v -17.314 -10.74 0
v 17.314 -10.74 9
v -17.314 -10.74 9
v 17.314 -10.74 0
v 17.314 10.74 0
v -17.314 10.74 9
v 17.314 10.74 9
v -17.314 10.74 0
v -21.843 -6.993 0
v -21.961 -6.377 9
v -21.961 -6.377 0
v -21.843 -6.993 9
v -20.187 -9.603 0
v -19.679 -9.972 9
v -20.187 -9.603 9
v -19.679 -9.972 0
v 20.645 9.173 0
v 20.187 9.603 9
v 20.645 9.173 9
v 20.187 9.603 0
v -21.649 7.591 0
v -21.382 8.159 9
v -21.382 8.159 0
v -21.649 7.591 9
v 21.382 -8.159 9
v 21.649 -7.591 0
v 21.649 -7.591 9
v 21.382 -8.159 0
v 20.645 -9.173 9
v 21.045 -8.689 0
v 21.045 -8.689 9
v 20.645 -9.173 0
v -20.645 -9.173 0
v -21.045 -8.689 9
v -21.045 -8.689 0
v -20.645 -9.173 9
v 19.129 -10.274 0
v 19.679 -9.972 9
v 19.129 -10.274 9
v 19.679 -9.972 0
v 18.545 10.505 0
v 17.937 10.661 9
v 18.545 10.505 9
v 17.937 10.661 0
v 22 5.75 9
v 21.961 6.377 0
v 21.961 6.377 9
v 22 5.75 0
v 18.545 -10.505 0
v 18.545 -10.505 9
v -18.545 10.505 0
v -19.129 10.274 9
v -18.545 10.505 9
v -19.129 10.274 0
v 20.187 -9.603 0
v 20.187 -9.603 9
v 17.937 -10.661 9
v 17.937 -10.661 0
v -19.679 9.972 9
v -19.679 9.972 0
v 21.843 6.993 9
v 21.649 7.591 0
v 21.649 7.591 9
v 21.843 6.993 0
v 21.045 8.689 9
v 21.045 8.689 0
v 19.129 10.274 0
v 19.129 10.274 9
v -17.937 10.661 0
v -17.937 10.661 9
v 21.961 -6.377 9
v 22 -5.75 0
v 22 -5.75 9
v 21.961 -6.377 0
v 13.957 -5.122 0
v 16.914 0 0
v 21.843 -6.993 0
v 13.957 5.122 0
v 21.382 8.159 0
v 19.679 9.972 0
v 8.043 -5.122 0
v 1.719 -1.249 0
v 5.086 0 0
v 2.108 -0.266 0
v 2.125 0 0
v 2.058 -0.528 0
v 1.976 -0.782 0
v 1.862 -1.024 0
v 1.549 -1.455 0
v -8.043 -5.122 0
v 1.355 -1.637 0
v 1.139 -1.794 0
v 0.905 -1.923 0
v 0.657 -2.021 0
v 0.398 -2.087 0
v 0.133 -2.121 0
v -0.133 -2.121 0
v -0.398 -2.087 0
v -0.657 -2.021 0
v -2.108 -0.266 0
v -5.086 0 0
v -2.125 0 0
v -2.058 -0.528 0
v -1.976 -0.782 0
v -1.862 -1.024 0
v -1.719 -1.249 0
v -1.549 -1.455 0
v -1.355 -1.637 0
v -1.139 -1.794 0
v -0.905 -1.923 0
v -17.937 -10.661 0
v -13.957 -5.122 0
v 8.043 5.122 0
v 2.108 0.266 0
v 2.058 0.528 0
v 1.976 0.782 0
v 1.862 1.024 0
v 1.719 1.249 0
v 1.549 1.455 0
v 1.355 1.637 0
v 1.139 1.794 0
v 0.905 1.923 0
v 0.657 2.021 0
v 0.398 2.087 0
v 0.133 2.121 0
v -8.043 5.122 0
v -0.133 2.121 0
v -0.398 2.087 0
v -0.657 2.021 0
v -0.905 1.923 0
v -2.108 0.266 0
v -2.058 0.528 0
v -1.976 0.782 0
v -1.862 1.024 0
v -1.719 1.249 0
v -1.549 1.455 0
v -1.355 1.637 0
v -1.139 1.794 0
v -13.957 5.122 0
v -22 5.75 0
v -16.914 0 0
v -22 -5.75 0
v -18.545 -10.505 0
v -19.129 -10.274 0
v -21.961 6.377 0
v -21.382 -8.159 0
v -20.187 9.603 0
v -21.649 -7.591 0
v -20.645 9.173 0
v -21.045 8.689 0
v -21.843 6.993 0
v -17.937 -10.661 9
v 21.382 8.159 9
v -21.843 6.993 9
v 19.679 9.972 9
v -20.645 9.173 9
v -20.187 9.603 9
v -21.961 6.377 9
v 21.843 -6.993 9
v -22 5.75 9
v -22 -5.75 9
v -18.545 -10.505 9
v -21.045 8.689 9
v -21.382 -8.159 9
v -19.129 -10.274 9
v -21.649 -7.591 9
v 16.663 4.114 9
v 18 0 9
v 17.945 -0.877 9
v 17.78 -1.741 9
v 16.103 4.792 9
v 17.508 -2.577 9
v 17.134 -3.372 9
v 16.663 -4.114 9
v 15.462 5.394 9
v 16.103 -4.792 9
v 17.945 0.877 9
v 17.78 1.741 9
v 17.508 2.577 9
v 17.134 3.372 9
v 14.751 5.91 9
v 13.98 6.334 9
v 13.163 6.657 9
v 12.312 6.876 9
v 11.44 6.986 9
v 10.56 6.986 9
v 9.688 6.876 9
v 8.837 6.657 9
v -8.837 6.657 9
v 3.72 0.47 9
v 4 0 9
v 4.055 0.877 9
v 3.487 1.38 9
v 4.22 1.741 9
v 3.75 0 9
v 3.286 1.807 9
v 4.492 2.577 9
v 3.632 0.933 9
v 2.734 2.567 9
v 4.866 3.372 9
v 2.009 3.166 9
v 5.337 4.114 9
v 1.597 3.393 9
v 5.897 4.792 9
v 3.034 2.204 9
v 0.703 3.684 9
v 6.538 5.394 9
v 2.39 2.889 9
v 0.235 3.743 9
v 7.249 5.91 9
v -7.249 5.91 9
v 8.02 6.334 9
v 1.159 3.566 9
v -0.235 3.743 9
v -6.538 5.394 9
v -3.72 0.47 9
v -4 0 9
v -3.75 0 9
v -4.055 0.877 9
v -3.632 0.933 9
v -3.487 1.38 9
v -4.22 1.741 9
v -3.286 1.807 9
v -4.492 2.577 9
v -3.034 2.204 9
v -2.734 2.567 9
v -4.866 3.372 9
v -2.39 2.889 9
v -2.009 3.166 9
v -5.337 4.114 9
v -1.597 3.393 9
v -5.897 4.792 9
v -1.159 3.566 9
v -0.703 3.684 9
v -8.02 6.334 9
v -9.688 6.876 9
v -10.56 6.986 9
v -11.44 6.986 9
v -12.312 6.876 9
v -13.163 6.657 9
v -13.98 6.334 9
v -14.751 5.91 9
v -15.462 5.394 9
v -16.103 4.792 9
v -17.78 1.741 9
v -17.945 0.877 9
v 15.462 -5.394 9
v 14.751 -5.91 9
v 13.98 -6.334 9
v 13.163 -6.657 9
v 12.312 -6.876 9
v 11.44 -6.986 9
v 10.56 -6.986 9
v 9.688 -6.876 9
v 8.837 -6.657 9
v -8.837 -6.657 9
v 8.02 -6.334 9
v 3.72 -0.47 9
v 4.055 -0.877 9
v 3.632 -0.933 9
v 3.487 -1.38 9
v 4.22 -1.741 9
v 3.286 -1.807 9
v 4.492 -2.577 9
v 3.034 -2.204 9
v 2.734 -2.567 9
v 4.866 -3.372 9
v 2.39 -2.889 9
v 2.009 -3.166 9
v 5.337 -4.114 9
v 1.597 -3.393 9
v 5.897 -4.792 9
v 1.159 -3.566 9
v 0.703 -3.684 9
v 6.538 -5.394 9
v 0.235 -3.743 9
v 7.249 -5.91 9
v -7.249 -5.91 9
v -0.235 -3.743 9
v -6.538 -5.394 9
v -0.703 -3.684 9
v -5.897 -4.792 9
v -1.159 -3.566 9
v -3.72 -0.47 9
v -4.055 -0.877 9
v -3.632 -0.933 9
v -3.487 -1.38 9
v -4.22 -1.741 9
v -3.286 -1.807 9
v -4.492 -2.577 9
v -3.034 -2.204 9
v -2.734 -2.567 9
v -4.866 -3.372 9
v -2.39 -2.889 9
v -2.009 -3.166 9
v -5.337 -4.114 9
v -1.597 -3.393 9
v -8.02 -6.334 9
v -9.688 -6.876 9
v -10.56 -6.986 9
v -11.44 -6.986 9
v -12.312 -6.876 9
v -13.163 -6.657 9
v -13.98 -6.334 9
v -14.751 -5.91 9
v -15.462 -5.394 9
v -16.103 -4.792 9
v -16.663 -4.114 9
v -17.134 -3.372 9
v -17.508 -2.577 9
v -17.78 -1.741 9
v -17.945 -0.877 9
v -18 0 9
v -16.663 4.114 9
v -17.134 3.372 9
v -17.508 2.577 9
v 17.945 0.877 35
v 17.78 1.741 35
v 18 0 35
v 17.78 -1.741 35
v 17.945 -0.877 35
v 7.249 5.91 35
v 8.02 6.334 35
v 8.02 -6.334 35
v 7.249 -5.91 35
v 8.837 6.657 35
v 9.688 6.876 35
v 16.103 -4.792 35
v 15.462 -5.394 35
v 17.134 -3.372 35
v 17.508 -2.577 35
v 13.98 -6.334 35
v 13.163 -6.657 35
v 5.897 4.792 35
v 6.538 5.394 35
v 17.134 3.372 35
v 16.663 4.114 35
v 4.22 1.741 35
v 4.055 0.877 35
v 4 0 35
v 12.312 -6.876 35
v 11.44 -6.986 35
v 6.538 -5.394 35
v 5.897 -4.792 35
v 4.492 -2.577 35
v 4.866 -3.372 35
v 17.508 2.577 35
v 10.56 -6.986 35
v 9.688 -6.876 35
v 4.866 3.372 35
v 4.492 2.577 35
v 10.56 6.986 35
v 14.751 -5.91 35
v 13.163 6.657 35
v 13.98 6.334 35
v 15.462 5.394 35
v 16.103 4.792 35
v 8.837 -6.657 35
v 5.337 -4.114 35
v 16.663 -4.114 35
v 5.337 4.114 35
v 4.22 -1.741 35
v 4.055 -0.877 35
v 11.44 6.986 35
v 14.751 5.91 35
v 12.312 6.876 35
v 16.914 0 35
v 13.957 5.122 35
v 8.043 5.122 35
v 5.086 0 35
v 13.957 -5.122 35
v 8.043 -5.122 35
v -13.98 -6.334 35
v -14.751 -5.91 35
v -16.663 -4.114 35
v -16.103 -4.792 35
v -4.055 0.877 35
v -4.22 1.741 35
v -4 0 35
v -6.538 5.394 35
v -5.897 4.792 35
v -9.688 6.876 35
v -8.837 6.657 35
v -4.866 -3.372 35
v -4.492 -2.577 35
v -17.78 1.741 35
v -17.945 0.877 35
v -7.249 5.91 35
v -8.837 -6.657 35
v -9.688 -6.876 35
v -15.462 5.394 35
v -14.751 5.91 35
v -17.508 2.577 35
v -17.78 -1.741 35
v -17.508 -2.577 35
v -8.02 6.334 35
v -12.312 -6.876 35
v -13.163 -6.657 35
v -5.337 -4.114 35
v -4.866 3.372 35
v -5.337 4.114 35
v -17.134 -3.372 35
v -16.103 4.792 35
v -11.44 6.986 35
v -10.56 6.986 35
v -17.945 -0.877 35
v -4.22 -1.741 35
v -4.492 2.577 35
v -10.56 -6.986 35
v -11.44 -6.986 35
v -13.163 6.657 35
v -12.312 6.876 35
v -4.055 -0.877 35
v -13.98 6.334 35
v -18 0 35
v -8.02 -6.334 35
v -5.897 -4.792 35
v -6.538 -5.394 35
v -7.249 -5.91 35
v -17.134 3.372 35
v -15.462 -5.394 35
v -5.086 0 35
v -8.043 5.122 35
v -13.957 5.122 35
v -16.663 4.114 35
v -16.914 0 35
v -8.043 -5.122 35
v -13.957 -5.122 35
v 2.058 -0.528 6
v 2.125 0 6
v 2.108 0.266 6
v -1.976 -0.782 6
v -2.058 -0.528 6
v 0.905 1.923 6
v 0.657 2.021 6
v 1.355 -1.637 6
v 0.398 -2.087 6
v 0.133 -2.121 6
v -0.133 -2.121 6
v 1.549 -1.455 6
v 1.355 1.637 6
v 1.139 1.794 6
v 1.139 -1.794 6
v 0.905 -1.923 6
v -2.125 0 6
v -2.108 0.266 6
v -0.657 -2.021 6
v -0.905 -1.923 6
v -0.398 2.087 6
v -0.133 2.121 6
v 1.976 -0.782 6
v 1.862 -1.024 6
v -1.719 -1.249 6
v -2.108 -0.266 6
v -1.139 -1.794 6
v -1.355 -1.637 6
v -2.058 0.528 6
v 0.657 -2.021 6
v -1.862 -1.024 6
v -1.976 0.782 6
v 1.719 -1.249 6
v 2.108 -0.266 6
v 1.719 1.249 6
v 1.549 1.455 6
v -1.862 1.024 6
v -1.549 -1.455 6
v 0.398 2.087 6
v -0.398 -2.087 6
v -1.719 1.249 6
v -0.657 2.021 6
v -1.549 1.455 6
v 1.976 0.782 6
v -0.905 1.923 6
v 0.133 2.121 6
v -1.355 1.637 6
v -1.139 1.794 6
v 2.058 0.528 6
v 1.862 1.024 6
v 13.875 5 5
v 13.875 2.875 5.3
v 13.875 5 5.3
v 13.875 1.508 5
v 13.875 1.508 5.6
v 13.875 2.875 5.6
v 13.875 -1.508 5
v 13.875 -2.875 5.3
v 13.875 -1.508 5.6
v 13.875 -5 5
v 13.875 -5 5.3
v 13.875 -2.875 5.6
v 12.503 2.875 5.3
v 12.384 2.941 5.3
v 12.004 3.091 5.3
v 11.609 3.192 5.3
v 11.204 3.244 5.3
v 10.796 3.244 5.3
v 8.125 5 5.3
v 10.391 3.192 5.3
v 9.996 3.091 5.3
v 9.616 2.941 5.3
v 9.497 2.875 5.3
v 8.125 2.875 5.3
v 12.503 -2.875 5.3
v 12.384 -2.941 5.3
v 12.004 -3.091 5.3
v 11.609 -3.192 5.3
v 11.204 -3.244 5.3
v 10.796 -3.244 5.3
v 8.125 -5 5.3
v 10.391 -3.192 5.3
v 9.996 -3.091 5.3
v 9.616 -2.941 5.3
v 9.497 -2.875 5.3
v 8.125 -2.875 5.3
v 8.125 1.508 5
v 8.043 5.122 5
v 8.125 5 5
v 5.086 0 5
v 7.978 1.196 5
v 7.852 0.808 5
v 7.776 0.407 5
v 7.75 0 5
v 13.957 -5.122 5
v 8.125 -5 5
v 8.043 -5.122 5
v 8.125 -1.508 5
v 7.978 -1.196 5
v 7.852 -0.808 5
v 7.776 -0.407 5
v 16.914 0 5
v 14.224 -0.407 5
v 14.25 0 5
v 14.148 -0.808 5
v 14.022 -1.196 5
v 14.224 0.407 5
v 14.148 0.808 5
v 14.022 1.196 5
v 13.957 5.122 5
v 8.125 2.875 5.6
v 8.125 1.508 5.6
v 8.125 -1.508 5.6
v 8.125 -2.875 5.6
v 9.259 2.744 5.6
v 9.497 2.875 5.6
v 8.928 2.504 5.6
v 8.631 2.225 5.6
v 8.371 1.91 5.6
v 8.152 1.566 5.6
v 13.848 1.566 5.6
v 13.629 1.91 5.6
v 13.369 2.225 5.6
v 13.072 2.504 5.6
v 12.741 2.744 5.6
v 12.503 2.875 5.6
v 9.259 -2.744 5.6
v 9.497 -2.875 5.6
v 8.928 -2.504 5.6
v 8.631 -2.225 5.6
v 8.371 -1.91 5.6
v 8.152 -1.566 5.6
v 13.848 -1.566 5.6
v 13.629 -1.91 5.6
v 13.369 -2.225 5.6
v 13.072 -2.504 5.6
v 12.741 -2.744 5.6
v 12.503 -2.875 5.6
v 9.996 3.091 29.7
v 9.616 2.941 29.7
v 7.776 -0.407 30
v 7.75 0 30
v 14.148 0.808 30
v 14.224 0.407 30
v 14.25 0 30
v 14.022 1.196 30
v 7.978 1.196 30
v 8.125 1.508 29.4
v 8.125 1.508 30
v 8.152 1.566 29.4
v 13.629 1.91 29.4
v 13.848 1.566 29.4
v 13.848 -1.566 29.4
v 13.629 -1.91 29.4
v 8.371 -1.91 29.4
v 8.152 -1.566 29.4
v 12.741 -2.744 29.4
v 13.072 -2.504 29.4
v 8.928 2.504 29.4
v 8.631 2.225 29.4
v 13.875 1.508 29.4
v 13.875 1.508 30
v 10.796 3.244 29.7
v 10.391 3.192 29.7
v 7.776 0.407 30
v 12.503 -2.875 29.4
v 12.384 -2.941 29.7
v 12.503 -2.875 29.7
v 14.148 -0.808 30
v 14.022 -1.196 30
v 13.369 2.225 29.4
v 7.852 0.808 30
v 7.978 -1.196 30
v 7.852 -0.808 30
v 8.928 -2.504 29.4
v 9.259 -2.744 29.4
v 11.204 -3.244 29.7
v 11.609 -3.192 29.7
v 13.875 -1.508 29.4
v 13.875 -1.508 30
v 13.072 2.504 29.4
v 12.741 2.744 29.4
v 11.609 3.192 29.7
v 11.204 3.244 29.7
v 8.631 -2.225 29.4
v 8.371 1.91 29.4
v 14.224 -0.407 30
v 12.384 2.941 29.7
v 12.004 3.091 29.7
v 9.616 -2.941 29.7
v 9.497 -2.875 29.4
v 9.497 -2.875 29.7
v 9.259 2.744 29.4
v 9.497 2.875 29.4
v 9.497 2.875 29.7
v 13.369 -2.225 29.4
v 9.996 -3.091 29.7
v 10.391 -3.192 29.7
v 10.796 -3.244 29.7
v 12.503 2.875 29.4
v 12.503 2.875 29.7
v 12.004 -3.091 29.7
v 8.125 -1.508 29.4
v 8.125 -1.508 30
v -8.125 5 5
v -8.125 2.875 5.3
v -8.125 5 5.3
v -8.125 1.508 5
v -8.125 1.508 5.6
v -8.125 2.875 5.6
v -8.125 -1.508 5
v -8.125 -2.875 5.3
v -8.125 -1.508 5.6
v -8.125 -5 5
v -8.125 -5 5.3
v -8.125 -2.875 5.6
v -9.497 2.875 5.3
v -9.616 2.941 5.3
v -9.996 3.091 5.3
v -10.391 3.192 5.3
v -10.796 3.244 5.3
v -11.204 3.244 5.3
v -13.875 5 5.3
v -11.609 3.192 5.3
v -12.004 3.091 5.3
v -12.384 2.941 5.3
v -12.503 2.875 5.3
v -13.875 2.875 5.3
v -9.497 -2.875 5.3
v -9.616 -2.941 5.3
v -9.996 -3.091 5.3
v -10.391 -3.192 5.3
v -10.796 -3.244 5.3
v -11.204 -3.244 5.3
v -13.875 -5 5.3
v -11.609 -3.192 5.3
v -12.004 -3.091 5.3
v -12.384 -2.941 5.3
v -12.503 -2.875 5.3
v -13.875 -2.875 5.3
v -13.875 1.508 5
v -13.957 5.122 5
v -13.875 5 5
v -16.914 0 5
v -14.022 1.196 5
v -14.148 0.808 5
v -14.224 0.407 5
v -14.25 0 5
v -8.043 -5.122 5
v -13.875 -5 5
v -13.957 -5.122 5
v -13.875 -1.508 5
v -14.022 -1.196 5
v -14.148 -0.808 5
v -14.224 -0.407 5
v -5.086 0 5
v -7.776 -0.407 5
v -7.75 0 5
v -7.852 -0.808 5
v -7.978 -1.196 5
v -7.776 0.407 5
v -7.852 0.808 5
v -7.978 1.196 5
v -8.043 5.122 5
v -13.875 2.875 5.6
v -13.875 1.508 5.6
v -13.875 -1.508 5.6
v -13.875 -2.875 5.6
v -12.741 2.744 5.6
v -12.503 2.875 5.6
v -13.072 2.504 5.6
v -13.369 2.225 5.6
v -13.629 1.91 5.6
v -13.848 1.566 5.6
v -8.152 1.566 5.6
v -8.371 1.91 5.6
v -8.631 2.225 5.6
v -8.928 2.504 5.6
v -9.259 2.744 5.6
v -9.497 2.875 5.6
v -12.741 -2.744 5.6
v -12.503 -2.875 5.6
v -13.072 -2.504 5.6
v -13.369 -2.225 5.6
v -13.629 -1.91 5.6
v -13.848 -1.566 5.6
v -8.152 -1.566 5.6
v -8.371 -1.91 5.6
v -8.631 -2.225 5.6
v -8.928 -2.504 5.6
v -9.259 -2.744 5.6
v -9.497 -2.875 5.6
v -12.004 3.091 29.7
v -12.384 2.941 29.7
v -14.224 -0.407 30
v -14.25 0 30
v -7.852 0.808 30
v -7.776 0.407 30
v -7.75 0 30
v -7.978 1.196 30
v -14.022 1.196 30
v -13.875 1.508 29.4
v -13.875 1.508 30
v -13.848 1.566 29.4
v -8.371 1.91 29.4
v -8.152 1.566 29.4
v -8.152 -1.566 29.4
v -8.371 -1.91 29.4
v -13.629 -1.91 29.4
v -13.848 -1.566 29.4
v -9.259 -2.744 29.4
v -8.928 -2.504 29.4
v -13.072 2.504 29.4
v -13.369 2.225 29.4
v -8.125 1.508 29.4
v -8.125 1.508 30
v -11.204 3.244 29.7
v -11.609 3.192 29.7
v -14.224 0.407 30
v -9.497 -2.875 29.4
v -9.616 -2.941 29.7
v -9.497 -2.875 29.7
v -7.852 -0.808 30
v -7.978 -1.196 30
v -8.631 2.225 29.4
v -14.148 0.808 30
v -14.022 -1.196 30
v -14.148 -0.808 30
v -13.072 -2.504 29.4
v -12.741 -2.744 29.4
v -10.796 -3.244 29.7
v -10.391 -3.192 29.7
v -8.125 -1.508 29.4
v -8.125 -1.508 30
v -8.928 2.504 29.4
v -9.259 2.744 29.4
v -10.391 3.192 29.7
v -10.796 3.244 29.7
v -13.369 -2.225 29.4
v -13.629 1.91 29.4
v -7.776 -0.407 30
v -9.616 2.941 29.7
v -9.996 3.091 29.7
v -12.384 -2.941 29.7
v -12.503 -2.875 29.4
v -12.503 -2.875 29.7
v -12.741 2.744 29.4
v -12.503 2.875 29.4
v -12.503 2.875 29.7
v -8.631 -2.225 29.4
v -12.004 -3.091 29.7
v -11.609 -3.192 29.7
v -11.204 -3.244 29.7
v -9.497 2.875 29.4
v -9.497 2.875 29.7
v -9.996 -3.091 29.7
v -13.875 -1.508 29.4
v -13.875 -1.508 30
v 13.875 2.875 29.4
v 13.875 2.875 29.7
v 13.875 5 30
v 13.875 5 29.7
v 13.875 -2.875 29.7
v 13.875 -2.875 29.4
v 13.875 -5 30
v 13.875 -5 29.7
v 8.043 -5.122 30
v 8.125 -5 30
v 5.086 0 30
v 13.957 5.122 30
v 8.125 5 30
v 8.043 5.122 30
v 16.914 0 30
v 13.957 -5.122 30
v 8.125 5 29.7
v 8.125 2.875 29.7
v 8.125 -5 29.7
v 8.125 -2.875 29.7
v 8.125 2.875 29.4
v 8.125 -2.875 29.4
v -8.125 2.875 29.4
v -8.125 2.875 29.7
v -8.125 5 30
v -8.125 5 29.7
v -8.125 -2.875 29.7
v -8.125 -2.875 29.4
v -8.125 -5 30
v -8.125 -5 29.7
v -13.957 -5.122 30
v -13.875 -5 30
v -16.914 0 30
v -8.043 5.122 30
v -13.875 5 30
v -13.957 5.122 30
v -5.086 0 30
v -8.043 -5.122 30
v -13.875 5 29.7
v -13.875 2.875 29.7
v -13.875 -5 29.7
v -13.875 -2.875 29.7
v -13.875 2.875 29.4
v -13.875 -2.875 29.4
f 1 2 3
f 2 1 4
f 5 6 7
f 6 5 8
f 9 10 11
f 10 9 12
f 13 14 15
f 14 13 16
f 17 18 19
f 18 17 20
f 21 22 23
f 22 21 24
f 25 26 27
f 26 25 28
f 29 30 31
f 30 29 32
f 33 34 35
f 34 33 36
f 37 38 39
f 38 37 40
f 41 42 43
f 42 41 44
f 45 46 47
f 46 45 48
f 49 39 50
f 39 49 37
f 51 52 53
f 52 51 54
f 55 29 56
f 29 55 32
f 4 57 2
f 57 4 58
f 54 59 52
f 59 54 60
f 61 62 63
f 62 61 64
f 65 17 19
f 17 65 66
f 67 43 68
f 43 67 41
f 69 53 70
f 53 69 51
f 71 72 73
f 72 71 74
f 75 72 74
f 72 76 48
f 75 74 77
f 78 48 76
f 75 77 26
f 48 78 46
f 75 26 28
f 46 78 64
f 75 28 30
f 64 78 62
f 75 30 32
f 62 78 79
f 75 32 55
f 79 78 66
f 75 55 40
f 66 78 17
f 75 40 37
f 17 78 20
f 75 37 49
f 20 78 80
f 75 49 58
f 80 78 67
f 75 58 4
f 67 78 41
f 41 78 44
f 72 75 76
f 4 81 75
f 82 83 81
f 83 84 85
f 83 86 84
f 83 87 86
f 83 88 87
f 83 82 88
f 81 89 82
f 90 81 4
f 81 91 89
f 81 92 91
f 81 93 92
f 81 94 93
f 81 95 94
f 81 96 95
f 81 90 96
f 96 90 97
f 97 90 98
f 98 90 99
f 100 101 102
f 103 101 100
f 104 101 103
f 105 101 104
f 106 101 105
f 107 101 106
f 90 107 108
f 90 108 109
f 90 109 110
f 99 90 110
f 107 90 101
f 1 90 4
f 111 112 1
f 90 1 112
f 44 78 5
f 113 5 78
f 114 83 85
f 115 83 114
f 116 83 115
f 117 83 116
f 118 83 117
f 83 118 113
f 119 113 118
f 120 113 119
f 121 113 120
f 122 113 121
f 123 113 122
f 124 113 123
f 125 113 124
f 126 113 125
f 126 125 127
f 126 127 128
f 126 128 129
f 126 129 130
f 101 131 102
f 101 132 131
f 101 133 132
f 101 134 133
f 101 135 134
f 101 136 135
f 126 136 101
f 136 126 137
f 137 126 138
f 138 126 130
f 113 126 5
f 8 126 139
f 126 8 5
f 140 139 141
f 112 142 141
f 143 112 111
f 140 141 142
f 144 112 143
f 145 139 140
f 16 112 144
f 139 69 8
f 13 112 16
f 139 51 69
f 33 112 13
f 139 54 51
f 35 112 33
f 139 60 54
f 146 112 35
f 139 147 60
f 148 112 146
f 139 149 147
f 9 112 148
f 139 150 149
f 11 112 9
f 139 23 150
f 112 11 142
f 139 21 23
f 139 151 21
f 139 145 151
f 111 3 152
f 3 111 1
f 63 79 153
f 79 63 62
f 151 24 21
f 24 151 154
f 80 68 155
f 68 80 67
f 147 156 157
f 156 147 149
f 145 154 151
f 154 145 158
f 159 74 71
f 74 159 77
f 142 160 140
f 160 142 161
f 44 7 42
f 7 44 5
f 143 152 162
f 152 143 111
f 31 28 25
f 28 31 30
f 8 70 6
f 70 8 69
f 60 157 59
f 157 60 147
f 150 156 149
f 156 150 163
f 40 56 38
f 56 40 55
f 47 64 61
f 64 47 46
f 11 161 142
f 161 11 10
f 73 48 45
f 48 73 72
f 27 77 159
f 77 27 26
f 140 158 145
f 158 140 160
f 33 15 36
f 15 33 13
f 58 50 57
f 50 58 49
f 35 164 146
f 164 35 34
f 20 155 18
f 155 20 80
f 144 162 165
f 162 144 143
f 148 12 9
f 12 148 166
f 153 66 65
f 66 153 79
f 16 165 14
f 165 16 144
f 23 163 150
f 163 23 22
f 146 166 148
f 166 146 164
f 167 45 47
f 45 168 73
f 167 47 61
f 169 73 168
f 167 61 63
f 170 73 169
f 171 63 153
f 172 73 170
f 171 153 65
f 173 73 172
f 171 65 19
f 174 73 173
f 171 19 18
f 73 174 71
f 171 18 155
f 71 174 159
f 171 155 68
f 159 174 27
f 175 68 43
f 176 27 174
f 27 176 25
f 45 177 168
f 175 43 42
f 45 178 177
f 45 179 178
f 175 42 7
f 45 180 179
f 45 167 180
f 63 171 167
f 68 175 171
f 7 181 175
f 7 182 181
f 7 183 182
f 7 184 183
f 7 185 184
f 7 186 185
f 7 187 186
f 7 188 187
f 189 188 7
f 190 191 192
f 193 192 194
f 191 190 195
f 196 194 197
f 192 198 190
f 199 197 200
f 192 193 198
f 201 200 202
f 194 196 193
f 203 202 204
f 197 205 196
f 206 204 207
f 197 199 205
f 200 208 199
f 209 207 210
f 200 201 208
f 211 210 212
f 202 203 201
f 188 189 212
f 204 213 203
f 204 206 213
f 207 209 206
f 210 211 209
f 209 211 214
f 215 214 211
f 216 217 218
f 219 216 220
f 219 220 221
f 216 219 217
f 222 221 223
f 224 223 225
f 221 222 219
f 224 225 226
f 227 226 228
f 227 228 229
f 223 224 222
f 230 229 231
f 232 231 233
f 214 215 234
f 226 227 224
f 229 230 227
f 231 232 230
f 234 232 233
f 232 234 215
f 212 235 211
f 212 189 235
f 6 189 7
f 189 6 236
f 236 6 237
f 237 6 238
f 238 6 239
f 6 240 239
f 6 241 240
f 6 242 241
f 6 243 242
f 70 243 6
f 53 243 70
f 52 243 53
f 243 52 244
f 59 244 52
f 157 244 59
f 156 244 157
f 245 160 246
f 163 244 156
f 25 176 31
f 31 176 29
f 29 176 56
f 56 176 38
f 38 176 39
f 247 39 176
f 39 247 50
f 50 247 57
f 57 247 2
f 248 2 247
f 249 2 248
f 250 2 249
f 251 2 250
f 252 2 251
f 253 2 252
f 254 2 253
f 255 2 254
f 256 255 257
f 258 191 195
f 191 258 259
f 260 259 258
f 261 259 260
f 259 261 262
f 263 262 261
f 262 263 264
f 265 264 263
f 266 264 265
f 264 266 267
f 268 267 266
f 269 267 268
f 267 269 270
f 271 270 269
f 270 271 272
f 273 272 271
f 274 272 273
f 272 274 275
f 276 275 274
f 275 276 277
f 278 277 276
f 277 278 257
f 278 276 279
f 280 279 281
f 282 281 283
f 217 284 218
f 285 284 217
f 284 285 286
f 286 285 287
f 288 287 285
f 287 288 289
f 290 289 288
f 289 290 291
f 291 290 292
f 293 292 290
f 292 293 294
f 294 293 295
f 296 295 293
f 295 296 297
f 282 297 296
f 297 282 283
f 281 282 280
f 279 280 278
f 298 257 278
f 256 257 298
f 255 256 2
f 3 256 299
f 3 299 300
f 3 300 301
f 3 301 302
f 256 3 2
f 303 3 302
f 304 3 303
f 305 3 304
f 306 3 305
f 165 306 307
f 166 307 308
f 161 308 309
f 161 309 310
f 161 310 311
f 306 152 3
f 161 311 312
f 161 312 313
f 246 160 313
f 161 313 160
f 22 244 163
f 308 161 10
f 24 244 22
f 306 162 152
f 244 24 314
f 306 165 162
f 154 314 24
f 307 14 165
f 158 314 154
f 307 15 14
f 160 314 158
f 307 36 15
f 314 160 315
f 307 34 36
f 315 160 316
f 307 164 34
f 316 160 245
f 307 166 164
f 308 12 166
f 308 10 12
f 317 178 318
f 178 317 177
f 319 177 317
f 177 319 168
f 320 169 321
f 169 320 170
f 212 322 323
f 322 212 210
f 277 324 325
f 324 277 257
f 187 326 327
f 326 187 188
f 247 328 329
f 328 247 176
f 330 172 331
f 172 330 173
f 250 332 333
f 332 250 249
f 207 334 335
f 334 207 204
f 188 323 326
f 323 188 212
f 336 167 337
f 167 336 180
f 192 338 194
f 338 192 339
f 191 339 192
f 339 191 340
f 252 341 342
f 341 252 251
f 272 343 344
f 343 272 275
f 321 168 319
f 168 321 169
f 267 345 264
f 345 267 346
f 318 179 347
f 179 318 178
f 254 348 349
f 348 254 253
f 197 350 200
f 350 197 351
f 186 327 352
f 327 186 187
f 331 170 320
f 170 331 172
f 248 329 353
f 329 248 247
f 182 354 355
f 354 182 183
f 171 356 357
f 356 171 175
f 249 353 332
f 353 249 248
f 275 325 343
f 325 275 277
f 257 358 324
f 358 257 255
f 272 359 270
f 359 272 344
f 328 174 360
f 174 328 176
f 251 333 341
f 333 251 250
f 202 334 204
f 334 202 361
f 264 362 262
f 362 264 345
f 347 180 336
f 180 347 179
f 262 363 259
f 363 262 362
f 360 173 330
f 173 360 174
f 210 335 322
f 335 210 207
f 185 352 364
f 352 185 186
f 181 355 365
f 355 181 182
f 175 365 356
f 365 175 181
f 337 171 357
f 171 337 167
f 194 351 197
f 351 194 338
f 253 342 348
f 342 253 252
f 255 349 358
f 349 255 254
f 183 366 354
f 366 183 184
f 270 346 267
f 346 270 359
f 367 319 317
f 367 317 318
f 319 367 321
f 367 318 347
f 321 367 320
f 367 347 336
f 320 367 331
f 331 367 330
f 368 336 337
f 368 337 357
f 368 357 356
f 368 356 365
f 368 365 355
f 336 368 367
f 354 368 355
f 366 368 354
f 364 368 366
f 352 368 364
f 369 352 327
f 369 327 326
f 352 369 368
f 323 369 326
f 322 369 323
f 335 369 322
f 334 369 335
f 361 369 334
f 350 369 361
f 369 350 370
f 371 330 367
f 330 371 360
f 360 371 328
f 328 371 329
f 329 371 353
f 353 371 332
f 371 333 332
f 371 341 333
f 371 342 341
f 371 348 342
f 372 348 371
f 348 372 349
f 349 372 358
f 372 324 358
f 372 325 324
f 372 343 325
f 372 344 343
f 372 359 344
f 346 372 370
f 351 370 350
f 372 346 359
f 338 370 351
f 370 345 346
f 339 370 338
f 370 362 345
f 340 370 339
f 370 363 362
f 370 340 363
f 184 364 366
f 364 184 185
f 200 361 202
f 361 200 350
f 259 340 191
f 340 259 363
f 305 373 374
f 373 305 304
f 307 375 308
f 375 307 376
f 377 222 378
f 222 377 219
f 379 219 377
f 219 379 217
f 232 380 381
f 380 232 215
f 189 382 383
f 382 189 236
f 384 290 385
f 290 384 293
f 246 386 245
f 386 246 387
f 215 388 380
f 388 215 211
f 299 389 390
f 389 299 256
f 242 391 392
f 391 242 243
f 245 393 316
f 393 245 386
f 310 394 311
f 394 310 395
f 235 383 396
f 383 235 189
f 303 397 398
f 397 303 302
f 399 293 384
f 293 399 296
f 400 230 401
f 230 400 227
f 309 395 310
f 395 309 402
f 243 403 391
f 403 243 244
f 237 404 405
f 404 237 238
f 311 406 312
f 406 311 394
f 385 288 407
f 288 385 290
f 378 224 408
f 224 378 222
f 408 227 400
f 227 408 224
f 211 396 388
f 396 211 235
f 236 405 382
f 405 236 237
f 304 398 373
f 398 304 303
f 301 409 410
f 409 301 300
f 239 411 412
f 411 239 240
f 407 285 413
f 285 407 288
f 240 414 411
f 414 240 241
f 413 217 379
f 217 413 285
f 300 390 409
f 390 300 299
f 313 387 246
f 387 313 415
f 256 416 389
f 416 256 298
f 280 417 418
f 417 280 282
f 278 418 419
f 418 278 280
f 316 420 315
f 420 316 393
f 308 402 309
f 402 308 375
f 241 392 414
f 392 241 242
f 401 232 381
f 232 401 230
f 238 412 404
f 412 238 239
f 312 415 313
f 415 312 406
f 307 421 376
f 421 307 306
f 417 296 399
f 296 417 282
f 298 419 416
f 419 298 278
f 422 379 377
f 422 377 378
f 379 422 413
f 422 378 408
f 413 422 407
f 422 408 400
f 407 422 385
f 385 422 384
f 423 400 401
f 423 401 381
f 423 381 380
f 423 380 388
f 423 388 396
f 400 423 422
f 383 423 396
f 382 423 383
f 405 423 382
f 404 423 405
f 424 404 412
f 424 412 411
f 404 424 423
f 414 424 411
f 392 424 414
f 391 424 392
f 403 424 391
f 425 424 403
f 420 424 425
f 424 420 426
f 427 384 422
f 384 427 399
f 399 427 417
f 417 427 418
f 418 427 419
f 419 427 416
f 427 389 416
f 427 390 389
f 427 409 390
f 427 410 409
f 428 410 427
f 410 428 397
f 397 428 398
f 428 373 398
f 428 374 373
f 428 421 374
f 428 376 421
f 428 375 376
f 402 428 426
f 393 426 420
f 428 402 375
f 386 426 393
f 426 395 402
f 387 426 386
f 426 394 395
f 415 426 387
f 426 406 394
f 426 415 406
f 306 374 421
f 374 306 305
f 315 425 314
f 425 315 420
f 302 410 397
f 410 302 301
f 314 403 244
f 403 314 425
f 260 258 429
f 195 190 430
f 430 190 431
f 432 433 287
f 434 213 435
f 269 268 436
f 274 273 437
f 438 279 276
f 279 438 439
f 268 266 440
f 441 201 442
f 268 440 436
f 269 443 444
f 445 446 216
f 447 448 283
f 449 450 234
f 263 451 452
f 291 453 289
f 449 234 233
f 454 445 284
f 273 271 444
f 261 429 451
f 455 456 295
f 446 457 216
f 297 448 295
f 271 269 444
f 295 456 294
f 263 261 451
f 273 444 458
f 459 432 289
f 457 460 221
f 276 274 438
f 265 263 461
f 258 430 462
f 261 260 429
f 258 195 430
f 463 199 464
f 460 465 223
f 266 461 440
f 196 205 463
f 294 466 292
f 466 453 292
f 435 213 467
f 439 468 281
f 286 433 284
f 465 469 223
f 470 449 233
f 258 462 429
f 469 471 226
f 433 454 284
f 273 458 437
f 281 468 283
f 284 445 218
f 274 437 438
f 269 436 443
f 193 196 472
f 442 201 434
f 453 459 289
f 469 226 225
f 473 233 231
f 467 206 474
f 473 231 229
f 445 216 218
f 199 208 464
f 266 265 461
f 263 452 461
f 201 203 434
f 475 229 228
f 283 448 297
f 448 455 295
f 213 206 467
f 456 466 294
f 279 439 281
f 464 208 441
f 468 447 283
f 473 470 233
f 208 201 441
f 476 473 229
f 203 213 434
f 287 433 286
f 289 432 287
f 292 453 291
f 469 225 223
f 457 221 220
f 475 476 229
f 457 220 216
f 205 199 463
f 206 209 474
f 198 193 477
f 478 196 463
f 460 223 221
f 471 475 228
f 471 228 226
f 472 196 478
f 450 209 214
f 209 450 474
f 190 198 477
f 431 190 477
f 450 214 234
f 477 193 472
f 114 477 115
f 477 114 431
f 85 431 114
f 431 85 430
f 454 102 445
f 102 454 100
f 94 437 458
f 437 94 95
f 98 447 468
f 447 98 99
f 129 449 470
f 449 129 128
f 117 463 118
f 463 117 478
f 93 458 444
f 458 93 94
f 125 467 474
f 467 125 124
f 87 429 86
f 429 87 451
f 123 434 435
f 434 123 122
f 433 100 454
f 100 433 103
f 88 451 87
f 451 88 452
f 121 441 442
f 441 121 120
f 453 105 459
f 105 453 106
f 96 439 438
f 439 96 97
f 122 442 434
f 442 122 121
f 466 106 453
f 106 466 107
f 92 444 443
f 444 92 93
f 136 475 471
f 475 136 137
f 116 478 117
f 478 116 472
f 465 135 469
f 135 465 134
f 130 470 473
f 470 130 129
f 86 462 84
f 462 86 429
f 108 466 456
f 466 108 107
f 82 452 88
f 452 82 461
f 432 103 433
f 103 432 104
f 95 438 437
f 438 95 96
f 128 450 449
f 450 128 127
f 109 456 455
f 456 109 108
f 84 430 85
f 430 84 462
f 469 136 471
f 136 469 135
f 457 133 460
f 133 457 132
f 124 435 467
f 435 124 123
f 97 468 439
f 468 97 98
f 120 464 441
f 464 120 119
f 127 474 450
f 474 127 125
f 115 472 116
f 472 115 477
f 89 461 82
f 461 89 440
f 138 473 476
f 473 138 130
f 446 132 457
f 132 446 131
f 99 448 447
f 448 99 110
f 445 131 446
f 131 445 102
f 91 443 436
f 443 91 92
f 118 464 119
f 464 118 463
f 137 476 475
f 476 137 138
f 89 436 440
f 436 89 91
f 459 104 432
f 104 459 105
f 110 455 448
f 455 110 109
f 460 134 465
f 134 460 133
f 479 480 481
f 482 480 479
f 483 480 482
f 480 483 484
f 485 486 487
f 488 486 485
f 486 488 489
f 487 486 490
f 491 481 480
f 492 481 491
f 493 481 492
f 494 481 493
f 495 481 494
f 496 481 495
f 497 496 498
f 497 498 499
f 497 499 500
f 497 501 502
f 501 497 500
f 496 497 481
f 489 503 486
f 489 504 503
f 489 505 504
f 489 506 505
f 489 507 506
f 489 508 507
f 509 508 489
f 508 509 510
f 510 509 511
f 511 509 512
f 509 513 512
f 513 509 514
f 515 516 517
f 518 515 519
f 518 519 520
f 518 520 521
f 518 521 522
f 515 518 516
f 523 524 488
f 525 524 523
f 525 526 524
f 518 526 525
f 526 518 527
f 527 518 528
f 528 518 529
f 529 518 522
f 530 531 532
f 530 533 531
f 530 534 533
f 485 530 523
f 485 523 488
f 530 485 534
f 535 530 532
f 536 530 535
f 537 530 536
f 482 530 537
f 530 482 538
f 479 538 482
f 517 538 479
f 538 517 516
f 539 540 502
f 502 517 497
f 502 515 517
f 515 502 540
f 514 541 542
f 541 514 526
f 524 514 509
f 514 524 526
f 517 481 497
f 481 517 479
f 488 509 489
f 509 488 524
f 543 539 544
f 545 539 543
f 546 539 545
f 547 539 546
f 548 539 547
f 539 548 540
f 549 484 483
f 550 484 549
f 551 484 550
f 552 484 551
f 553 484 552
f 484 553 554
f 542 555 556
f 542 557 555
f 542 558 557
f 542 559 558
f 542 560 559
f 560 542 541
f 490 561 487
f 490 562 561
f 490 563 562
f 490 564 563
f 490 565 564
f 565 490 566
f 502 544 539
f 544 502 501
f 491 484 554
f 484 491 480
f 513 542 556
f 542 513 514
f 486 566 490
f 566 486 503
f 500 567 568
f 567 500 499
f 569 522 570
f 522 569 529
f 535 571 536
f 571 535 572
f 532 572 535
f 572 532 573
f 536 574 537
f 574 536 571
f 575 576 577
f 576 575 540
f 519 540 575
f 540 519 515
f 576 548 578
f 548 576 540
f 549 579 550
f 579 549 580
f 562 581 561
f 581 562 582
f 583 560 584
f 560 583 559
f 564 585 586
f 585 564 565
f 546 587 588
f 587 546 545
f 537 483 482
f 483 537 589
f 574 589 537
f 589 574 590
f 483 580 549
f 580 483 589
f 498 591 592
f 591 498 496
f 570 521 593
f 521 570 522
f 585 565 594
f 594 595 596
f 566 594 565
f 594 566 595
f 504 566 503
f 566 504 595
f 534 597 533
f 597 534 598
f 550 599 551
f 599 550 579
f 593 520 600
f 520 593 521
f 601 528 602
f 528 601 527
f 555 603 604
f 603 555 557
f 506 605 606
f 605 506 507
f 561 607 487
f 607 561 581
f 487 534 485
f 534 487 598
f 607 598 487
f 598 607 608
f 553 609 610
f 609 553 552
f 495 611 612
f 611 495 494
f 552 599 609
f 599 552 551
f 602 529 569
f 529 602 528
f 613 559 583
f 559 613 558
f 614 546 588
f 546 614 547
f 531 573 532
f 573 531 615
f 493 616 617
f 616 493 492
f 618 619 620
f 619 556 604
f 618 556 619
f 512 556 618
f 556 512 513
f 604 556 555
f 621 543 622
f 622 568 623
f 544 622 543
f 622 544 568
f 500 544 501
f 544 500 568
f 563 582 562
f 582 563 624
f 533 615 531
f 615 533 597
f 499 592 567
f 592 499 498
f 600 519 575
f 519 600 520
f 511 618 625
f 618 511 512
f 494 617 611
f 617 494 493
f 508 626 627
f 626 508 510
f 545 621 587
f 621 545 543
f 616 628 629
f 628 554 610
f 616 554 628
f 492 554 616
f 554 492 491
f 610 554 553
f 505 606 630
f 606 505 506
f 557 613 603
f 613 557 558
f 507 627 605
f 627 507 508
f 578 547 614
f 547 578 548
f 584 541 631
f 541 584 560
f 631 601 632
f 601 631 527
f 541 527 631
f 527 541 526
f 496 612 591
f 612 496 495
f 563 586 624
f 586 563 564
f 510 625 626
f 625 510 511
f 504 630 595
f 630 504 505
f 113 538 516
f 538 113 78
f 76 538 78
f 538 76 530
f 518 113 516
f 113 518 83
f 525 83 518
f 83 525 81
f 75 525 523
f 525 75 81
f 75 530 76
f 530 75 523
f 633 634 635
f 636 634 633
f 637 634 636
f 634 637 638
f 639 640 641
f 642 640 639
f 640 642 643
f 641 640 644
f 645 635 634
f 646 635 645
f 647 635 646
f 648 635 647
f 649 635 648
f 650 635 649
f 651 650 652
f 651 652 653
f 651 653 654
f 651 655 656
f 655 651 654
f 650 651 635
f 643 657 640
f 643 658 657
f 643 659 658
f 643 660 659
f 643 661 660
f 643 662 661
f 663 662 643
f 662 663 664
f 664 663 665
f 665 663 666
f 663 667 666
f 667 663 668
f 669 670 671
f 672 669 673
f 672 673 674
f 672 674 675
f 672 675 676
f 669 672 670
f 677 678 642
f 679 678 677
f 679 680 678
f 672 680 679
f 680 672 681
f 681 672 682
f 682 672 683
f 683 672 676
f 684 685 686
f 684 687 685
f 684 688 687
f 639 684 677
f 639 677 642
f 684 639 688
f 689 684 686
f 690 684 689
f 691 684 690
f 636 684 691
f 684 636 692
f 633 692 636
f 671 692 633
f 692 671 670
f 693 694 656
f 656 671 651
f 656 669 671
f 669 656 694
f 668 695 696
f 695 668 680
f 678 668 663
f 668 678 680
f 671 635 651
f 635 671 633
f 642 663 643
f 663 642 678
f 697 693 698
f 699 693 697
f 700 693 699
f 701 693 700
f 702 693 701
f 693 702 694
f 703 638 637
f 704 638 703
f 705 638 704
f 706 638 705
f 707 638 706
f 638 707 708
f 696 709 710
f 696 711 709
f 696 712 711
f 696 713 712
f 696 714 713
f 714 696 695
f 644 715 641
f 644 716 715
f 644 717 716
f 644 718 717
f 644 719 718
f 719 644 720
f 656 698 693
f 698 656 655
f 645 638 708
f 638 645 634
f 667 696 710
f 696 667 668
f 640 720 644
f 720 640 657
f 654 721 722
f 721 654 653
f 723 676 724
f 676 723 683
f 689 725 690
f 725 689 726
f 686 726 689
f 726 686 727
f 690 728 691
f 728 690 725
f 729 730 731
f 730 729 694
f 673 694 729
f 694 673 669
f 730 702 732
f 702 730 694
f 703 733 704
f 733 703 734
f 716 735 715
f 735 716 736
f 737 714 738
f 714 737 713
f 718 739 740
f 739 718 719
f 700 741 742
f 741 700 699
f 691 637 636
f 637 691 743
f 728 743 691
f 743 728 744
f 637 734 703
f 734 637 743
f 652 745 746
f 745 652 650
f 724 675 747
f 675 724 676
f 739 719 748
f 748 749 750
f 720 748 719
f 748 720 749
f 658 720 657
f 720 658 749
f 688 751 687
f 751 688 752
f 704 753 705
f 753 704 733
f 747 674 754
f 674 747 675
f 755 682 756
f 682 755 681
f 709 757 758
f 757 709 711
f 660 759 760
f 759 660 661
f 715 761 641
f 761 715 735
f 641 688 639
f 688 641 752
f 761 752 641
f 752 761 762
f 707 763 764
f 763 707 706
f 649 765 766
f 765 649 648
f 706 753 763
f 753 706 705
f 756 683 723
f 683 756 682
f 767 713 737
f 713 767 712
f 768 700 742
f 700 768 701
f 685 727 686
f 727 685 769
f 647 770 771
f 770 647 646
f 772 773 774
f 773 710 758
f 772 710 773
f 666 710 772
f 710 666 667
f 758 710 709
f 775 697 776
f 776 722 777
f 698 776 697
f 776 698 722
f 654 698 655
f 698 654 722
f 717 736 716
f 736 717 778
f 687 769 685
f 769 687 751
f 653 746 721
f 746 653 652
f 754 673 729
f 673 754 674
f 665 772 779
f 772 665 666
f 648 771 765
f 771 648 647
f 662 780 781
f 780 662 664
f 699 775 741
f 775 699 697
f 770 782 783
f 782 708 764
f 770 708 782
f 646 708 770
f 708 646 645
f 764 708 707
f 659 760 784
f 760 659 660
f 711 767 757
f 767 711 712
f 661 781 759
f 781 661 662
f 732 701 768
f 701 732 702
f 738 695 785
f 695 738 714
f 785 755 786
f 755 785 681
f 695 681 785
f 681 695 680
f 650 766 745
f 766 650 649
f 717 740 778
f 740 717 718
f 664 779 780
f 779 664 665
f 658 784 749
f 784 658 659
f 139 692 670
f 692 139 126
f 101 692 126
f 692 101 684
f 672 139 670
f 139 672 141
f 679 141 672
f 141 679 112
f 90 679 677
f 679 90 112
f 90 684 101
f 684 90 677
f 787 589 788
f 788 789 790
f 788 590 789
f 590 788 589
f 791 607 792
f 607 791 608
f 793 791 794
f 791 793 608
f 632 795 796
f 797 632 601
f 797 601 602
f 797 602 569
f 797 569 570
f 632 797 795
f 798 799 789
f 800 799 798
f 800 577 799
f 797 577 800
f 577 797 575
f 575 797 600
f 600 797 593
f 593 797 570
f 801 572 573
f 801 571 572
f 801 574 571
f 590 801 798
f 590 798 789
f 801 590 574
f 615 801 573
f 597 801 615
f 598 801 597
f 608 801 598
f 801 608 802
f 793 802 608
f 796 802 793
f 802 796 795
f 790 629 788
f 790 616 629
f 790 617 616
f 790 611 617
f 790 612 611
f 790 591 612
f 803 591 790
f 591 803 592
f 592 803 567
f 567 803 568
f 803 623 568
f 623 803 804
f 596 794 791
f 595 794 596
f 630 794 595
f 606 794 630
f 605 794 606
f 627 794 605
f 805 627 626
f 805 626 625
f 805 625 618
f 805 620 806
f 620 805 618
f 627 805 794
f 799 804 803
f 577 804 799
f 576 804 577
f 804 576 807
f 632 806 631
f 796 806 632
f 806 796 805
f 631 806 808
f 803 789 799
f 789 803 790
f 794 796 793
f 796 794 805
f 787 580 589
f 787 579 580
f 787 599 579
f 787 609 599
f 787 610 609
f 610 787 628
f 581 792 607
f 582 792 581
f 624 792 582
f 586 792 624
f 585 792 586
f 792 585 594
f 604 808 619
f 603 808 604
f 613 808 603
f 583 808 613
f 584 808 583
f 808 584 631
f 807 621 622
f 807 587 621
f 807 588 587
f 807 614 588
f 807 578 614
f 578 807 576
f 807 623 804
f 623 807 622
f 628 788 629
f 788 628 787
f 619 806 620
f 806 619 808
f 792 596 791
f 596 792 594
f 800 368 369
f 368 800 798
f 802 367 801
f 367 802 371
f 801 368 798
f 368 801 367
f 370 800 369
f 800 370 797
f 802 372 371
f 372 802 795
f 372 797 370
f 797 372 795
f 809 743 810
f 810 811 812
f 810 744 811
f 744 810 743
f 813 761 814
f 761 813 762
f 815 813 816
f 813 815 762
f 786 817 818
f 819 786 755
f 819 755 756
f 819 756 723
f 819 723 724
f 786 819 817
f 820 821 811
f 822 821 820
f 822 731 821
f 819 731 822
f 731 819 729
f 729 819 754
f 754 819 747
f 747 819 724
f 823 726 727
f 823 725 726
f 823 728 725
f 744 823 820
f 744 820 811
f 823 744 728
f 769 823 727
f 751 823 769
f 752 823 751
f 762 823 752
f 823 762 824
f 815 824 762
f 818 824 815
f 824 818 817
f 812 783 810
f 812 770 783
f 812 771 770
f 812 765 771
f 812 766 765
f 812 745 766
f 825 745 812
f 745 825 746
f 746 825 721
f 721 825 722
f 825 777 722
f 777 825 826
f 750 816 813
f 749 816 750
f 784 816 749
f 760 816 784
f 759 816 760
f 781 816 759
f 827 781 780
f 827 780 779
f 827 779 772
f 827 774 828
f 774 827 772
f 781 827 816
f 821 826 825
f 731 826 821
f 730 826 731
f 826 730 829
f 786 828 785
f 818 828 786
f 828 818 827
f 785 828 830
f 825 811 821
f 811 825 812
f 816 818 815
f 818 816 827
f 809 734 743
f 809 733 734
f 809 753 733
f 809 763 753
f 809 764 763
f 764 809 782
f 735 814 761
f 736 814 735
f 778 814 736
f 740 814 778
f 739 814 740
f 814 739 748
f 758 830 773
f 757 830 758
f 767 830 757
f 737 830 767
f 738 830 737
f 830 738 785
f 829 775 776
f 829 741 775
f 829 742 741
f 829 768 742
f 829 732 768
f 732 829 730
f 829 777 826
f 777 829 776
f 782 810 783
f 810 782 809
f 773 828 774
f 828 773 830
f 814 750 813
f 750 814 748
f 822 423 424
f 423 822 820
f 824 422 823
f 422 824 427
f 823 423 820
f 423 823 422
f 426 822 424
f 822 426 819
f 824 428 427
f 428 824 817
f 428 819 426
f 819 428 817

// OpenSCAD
$fn = 50;


difference() {
	union() {
		hull() {
			translate(v = [-17.0000000000, 5.7500000000, 0]) {
				cylinder(h = 9, r = 5);
			}
			translate(v = [17.0000000000, 5.7500000000, 0]) {
				cylinder(h = 9, r = 5);
			}
			translate(v = [-17.0000000000, -5.7500000000, 0]) {
				cylinder(h = 9, r = 5);
			}
			translate(v = [17.0000000000, -5.7500000000, 0]) {
				cylinder(h = 9, r = 5);
			}
		}
		translate(v = [11.0000000000, 0, 0.0000000000]) {
			cylinder(h = 35, r = 7.0000000000);
		}
		translate(v = [-11.0000000000, 0, 0.0000000000]) {
			cylinder(h = 35, r = 7.0000000000);
		}
	}
	union() {
		translate(v = [0, 0, 9]) {
			rotate(a = [0, 0, 0]) {
				difference() {
					union() {
						#translate(v = [0, 0, -30.0000000000]) {
							cylinder(h = 30, r = 2.0000000000);
						}
						#translate(v = [0, 0, -3]) {
							cylinder(h = 3, r1 = 2.1250000000, r2 = 3.7500000000);
						}
						#translate(v = [0, 0, -30.0000000000]) {
							cylinder(h = 30, r = 2.1250000000);
						}
						#translate(v = [0, 0, -30.0000000000]) {
							cylinder(h = 30, r = 2.0000000000);
						}
					}
					union();
				}
			}
		}
		translate(v = [11.0000000000, 0, 0]) {
			rotate(a = [0, 0, 0]) {
				difference() {
					union() {
						#translate(v = [-2.8750000000, -5.0000000000, -0.3000000000]) {
							cube(size = [5.7500000000, 10, 0.3000000000]);
						}
						#translate(v = [-2.8750000000, -2.8750000000, -0.6000000000]) {
							cube(size = [5.7500000000, 5.7500000000, 0.3000000000]);
						}
						#translate(v = [-2.8750000000, -5.0000000000, 5]) {
							cube(size = [5.7500000000, 10, 0.3000000000]);
						}
						#translate(v = [-2.8750000000, -2.8750000000, 5.3000000000]) {
							cube(size = [5.7500000000, 5.7500000000, 0.3000000000]);
						}
						#translate(v = [0, 0, -100.0000000000]) {
							cylinder(h = 200, r = 3.2500000000);
						}
						#linear_extrude(height = 5) {
							polygon(points = [[5.9142500000, 0.0000000000], [2.9571250000, 5.1218907443], [-2.9571250000, 5.1218907443], [-5.9142500000, 0.0000000000], [-2.9571250000, -5.1218907443], [2.9571250000, -5.1218907443]]);
						}
						#translate(v = [-2.8750000000, -5.0000000000, -0.3000000000]) {
							cube(size = [5.7500000000, 10, 0.3000000000]);
						}
						#translate(v = [-2.8750000000, -2.8750000000, -0.6000000000]) {
							cube(size = [5.7500000000, 5.7500000000, 0.3000000000]);
						}
						#translate(v = [-2.8750000000, -5.0000000000, 5]) {
							cube(size = [5.7500000000, 10, 0.3000000000]);
						}
						#translate(v = [-2.8750000000, -2.8750000000, 5.3000000000]) {
							cube(size = [5.7500000000, 5.7500000000, 0.3000000000]);
						}
						#translate(v = [0, 0, -100.0000000000]) {
							cylinder(h = 200, r = 3.2500000000);
						}
						#translate(v = [-2.8750000000, -5.0000000000, -0.3000000000]) {
							cube(size = [5.7500000000, 10, 0.3000000000]);
						}
						#translate(v = [-2.8750000000, -2.8750000000, -0.6000000000]) {
							cube(size = [5.7500000000, 5.7500000000, 0.3000000000]);
						}
						#translate(v = [-2.8750000000, -5.0000000000, 5]) {
							cube(size = [5.7500000000, 10, 0.3000000000]);
						}
						#translate(v = [-2.8750000000, -2.8750000000, 5.3000000000]) {
							cube(size = [5.7500000000, 5.7500000000, 0.3000000000]);
						}
						#translate(v = [0, 0, -100.0000000000]) {
							cylinder(h = 200, r = 3.2500000000);
						}
					}
					union();
				}
			}
		}
		translate(v = [-11.0000000000, 0, 0]) {
			rotate(a = [0, 0, 0]) {
				difference() {
					union() {
						#translate(v = [-2.8750000000, -5.0000000000, -0.3000000000]) {
							cube(size = [5.7500000000, 10, 0.3000000000]);
						}
						#translate(v = [-2.8750000000, -2.8750000000, -0.6000000000]) {
							cube(size = [5.7500000000, 5.7500000000, 0.3000000000]);
						}
						#translate(v = [-2.8750000000, -5.0000000000, 5]) {
							cube(size = [5.7500000000, 10, 0.3000000000]);
						}
						#translate(v = [-2.8750000000, -2.8750000000, 5.3000000000]) {
							cube(size = [5.7500000000, 5.7500000000, 0.3000000000]);
						}
						#translate(v = [0, 0, -100.0000000000]) {
							cylinder(h = 200, r = 3.2500000000);
						}
						#linear_extrude(height = 5) {
							polygon(points = [[5.9142500000, 0.0000000000], [2.9571250000, 5.1218907443], [-2.9571250000, 5.1218907443], [-5.9142500000, 0.0000000000], [-2.9571250000, -5.1218907443], [2.9571250000, -5.1218907443]]);
						}
						#translate(v = [-2.8750000000, -5.0000000000, -0.3000000000]) {
							cube(size = [5.7500000000, 10, 0.3000000000]);
						}
						#translate(v = [-2.8750000000, -2.8750000000, -0.6000000000]) {
							cube(size = [5.7500000000, 5.7500000000, 0.3000000000]);
						}
						#translate(v = [-2.8750000000, -5.0000000000, 5]) {
							cube(size = [5.7500000000, 10, 0.3000000000]);
						}
						#translate(v = [-2.8750000000, -2.8750000000, 5.3000000000]) {
							cube(size = [5.7500000000, 5.7500000000, 0.3000000000]);
						}
						#translate(v = [0, 0, -100.0000000000]) {
							cylinder(h = 200, r = 3.2500000000);
						}
						#translate(v = [-2.8750000000, -5.0000000000, -0.3000000000]) {
							cube(size = [5.7500000000, 10, 0.3000000000]);
						}
						#translate(v = [-2.8750000000, -2.8750000000, -0.6000000000]) {
							cube(size = [5.7500000000, 5.7500000000, 0.3000000000]);
						}
						#translate(v = [-2.8750000000, -5.0000000000, 5]) {
							cube(size = [5.7500000000, 10, 0.3000000000]);
						}
						#translate(v = [-2.8750000000, -2.8750000000, 5.3000000000]) {
							cube(size = [5.7500000000, 5.7500000000, 0.3000000000]);
						}
						#translate(v = [0, 0, -100.0000000000]) {
							cylinder(h = 200, r = 3.2500000000);
						}
					}
					union();
				}
			}
		}
		translate(v = [11.0000000000, 0, 35]) {
			rotate(a = [0, 0, 0]) {
				difference() {
					union() {
						#translate(v = [-2.8750000000, -5.0000000000, -5.3000000000]) {
							cube(size = [5.7500000000, 10, 0.3000000000]);
						}
						#translate(v = [-2.8750000000, -2.8750000000, -5.6000000000]) {
							cube(size = [5.7500000000, 5.7500000000, 0.3000000000]);
						}
						#translate(v = [-2.8750000000, -5.0000000000, 0]) {
							cube(size = [5.7500000000, 10, 0.3000000000]);
						}
						#translate(v = [-2.8750000000, -2.8750000000, 0.3000000000]) {
							cube(size = [5.7500000000, 5.7500000000, 0.3000000000]);
						}
						#translate(v = [0, 0, -100.0000000000]) {
							cylinder(h = 200, r = 3.2500000000);
						}
						translate(v = [0, 0, -5]) {
							#linear_extrude(height = 5) {
								polygon(points = [[5.9142500000, 0.0000000000], [2.9571250000, 5.1218907443], [-2.9571250000, 5.1218907443], [-5.9142500000, 0.0000000000], [-2.9571250000, -5.1218907443], [2.9571250000, -5.1218907443]]);
							}
						}
						#translate(v = [-2.8750000000, -5.0000000000, -5.3000000000]) {
							cube(size = [5.7500000000, 10, 0.3000000000]);
						}
						#translate(v = [-2.8750000000, -2.8750000000, -5.6000000000]) {
							cube(size = [5.7500000000, 5.7500000000, 0.3000000000]);
						}
						#translate(v = [-2.8750000000, -5.0000000000, 0]) {
							cube(size = [5.7500000000, 10, 0.3000000000]);
						}
						#translate(v = [-2.8750000000, -2.8750000000, 0.3000000000]) {
							cube(size = [5.7500000000, 5.7500000000, 0.3000000000]);
						}
						#translate(v = [0, 0, -100.0000000000]) {
							cylinder(h = 200, r = 3.2500000000);
						}
						#translate(v = [-2.8750000000, -5.0000000000, -5.3000000000]) {
							cube(size = [5.7500000000, 10, 0.3000000000]);
						}
						#translate(v = [-2.8750000000, -2.8750000000, -5.6000000000]) {
							cube(size = [5.7500000000, 5.7500000000, 0.3000000000]);
						}
						#translate(v = [-2.8750000000, -5.0000000000, 0]) {
							cube(size = [5.7500000000, 10, 0.3000000000]);
						}
						#translate(v = [-2.8750000000, -2.8750000000, 0.3000000000]) {
							cube(size = [5.7500000000, 5.7500000000, 0.3000000000]);
						}
						#translate(v = [0, 0, -100.0000000000]) {
							cylinder(h = 200, r = 3.2500000000);
						}
					}
					union();
				}
			}
		}
		translate(v = [-11.0000000000, 0, 35]) {
			rotate(a = [0, 0, 0]) {
				difference() {
					union() {
						#translate(v = [-2.8750000000, -5.0000000000, -5.3000000000]) {
							cube(size = [5.7500000000, 10, 0.3000000000]);
						}
						#translate(v = [-2.8750000000, -2.8750000000, -5.6000000000]) {
							cube(size = [5.7500000000, 5.7500000000, 0.3000000000]);
						}
						#translate(v = [-2.8750000000, -5.0000000000, 0]) {
							cube(size = [5.7500000000, 10, 0.3000000000]);
						}
						#translate(v = [-2.8750000000, -2.8750000000, 0.3000000000]) {
							cube(size = [5.7500000000, 5.7500000000, 0.3000000000]);
						}
						#translate(v = [0, 0, -100.0000000000]) {
							cylinder(h = 200, r = 3.2500000000);
						}
						translate(v = [0, 0, -5]) {
							#linear_extrude(height = 5) {
								polygon(points = [[5.9142500000, 0.0000000000], [2.9571250000, 5.1218907443], [-2.9571250000, 5.1218907443], [-5.9142500000, 0.0000000000], [-2.9571250000, -5.1218907443], [2.9571250000, -5.1218907443]]);
							}
						}
						#translate(v = [-2.8750000000, -5.0000000000, -5.3000000000]) {
							cube(size = [5.7500000000, 10, 0.3000000000]);
						}
						#translate(v = [-2.8750000000, -2.8750000000, -5.6000000000]) {
							cube(size = [5.7500000000, 5.7500000000, 0.3000000000]);
						}
						#translate(v = [-2.8750000000, -5.0000000000, 0]) {
							cube(size = [5.7500000000, 10, 0.3000000000]);
						}
						#translate(v = [-2.8750000000, -2.8750000000, 0.3000000000]) {
							cube(size = [5.7500000000, 5.7500000000, 0.3000000000]);
						}
						#translate(v = [0, 0, -100.0000000000]) {
							cylinder(h = 200, r = 3.2500000000);
						}
						#translate(v = [-2.8750000000, -5.0000000000, -5.3000000000]) {
							cube(size = [5.7500000000, 10, 0.3000000000]);
						}
						#translate(v = [-2.8750000000, -2.8750000000, -5.6000000000]) {
							cube(size = [5.7500000000, 5.7500000000, 0.3000000000]);
						}
						#translate(v = [-2.8750000000, -5.0000000000, 0]) {
							cube(size = [5.7500000000, 10, 0.3000000000]);
						}
						#translate(v = [-2.8750000000, -2.8750000000, 0.3000000000]) {
							cube(size = [5.7500000000, 5.7500000000, 0.3000000000]);
						}
						#translate(v = [0, 0, -100.0000000000]) {
							cylinder(h = 200, r = 3.2500000000);
						}
					}
					union();
				}
			}
		}
	}
}
